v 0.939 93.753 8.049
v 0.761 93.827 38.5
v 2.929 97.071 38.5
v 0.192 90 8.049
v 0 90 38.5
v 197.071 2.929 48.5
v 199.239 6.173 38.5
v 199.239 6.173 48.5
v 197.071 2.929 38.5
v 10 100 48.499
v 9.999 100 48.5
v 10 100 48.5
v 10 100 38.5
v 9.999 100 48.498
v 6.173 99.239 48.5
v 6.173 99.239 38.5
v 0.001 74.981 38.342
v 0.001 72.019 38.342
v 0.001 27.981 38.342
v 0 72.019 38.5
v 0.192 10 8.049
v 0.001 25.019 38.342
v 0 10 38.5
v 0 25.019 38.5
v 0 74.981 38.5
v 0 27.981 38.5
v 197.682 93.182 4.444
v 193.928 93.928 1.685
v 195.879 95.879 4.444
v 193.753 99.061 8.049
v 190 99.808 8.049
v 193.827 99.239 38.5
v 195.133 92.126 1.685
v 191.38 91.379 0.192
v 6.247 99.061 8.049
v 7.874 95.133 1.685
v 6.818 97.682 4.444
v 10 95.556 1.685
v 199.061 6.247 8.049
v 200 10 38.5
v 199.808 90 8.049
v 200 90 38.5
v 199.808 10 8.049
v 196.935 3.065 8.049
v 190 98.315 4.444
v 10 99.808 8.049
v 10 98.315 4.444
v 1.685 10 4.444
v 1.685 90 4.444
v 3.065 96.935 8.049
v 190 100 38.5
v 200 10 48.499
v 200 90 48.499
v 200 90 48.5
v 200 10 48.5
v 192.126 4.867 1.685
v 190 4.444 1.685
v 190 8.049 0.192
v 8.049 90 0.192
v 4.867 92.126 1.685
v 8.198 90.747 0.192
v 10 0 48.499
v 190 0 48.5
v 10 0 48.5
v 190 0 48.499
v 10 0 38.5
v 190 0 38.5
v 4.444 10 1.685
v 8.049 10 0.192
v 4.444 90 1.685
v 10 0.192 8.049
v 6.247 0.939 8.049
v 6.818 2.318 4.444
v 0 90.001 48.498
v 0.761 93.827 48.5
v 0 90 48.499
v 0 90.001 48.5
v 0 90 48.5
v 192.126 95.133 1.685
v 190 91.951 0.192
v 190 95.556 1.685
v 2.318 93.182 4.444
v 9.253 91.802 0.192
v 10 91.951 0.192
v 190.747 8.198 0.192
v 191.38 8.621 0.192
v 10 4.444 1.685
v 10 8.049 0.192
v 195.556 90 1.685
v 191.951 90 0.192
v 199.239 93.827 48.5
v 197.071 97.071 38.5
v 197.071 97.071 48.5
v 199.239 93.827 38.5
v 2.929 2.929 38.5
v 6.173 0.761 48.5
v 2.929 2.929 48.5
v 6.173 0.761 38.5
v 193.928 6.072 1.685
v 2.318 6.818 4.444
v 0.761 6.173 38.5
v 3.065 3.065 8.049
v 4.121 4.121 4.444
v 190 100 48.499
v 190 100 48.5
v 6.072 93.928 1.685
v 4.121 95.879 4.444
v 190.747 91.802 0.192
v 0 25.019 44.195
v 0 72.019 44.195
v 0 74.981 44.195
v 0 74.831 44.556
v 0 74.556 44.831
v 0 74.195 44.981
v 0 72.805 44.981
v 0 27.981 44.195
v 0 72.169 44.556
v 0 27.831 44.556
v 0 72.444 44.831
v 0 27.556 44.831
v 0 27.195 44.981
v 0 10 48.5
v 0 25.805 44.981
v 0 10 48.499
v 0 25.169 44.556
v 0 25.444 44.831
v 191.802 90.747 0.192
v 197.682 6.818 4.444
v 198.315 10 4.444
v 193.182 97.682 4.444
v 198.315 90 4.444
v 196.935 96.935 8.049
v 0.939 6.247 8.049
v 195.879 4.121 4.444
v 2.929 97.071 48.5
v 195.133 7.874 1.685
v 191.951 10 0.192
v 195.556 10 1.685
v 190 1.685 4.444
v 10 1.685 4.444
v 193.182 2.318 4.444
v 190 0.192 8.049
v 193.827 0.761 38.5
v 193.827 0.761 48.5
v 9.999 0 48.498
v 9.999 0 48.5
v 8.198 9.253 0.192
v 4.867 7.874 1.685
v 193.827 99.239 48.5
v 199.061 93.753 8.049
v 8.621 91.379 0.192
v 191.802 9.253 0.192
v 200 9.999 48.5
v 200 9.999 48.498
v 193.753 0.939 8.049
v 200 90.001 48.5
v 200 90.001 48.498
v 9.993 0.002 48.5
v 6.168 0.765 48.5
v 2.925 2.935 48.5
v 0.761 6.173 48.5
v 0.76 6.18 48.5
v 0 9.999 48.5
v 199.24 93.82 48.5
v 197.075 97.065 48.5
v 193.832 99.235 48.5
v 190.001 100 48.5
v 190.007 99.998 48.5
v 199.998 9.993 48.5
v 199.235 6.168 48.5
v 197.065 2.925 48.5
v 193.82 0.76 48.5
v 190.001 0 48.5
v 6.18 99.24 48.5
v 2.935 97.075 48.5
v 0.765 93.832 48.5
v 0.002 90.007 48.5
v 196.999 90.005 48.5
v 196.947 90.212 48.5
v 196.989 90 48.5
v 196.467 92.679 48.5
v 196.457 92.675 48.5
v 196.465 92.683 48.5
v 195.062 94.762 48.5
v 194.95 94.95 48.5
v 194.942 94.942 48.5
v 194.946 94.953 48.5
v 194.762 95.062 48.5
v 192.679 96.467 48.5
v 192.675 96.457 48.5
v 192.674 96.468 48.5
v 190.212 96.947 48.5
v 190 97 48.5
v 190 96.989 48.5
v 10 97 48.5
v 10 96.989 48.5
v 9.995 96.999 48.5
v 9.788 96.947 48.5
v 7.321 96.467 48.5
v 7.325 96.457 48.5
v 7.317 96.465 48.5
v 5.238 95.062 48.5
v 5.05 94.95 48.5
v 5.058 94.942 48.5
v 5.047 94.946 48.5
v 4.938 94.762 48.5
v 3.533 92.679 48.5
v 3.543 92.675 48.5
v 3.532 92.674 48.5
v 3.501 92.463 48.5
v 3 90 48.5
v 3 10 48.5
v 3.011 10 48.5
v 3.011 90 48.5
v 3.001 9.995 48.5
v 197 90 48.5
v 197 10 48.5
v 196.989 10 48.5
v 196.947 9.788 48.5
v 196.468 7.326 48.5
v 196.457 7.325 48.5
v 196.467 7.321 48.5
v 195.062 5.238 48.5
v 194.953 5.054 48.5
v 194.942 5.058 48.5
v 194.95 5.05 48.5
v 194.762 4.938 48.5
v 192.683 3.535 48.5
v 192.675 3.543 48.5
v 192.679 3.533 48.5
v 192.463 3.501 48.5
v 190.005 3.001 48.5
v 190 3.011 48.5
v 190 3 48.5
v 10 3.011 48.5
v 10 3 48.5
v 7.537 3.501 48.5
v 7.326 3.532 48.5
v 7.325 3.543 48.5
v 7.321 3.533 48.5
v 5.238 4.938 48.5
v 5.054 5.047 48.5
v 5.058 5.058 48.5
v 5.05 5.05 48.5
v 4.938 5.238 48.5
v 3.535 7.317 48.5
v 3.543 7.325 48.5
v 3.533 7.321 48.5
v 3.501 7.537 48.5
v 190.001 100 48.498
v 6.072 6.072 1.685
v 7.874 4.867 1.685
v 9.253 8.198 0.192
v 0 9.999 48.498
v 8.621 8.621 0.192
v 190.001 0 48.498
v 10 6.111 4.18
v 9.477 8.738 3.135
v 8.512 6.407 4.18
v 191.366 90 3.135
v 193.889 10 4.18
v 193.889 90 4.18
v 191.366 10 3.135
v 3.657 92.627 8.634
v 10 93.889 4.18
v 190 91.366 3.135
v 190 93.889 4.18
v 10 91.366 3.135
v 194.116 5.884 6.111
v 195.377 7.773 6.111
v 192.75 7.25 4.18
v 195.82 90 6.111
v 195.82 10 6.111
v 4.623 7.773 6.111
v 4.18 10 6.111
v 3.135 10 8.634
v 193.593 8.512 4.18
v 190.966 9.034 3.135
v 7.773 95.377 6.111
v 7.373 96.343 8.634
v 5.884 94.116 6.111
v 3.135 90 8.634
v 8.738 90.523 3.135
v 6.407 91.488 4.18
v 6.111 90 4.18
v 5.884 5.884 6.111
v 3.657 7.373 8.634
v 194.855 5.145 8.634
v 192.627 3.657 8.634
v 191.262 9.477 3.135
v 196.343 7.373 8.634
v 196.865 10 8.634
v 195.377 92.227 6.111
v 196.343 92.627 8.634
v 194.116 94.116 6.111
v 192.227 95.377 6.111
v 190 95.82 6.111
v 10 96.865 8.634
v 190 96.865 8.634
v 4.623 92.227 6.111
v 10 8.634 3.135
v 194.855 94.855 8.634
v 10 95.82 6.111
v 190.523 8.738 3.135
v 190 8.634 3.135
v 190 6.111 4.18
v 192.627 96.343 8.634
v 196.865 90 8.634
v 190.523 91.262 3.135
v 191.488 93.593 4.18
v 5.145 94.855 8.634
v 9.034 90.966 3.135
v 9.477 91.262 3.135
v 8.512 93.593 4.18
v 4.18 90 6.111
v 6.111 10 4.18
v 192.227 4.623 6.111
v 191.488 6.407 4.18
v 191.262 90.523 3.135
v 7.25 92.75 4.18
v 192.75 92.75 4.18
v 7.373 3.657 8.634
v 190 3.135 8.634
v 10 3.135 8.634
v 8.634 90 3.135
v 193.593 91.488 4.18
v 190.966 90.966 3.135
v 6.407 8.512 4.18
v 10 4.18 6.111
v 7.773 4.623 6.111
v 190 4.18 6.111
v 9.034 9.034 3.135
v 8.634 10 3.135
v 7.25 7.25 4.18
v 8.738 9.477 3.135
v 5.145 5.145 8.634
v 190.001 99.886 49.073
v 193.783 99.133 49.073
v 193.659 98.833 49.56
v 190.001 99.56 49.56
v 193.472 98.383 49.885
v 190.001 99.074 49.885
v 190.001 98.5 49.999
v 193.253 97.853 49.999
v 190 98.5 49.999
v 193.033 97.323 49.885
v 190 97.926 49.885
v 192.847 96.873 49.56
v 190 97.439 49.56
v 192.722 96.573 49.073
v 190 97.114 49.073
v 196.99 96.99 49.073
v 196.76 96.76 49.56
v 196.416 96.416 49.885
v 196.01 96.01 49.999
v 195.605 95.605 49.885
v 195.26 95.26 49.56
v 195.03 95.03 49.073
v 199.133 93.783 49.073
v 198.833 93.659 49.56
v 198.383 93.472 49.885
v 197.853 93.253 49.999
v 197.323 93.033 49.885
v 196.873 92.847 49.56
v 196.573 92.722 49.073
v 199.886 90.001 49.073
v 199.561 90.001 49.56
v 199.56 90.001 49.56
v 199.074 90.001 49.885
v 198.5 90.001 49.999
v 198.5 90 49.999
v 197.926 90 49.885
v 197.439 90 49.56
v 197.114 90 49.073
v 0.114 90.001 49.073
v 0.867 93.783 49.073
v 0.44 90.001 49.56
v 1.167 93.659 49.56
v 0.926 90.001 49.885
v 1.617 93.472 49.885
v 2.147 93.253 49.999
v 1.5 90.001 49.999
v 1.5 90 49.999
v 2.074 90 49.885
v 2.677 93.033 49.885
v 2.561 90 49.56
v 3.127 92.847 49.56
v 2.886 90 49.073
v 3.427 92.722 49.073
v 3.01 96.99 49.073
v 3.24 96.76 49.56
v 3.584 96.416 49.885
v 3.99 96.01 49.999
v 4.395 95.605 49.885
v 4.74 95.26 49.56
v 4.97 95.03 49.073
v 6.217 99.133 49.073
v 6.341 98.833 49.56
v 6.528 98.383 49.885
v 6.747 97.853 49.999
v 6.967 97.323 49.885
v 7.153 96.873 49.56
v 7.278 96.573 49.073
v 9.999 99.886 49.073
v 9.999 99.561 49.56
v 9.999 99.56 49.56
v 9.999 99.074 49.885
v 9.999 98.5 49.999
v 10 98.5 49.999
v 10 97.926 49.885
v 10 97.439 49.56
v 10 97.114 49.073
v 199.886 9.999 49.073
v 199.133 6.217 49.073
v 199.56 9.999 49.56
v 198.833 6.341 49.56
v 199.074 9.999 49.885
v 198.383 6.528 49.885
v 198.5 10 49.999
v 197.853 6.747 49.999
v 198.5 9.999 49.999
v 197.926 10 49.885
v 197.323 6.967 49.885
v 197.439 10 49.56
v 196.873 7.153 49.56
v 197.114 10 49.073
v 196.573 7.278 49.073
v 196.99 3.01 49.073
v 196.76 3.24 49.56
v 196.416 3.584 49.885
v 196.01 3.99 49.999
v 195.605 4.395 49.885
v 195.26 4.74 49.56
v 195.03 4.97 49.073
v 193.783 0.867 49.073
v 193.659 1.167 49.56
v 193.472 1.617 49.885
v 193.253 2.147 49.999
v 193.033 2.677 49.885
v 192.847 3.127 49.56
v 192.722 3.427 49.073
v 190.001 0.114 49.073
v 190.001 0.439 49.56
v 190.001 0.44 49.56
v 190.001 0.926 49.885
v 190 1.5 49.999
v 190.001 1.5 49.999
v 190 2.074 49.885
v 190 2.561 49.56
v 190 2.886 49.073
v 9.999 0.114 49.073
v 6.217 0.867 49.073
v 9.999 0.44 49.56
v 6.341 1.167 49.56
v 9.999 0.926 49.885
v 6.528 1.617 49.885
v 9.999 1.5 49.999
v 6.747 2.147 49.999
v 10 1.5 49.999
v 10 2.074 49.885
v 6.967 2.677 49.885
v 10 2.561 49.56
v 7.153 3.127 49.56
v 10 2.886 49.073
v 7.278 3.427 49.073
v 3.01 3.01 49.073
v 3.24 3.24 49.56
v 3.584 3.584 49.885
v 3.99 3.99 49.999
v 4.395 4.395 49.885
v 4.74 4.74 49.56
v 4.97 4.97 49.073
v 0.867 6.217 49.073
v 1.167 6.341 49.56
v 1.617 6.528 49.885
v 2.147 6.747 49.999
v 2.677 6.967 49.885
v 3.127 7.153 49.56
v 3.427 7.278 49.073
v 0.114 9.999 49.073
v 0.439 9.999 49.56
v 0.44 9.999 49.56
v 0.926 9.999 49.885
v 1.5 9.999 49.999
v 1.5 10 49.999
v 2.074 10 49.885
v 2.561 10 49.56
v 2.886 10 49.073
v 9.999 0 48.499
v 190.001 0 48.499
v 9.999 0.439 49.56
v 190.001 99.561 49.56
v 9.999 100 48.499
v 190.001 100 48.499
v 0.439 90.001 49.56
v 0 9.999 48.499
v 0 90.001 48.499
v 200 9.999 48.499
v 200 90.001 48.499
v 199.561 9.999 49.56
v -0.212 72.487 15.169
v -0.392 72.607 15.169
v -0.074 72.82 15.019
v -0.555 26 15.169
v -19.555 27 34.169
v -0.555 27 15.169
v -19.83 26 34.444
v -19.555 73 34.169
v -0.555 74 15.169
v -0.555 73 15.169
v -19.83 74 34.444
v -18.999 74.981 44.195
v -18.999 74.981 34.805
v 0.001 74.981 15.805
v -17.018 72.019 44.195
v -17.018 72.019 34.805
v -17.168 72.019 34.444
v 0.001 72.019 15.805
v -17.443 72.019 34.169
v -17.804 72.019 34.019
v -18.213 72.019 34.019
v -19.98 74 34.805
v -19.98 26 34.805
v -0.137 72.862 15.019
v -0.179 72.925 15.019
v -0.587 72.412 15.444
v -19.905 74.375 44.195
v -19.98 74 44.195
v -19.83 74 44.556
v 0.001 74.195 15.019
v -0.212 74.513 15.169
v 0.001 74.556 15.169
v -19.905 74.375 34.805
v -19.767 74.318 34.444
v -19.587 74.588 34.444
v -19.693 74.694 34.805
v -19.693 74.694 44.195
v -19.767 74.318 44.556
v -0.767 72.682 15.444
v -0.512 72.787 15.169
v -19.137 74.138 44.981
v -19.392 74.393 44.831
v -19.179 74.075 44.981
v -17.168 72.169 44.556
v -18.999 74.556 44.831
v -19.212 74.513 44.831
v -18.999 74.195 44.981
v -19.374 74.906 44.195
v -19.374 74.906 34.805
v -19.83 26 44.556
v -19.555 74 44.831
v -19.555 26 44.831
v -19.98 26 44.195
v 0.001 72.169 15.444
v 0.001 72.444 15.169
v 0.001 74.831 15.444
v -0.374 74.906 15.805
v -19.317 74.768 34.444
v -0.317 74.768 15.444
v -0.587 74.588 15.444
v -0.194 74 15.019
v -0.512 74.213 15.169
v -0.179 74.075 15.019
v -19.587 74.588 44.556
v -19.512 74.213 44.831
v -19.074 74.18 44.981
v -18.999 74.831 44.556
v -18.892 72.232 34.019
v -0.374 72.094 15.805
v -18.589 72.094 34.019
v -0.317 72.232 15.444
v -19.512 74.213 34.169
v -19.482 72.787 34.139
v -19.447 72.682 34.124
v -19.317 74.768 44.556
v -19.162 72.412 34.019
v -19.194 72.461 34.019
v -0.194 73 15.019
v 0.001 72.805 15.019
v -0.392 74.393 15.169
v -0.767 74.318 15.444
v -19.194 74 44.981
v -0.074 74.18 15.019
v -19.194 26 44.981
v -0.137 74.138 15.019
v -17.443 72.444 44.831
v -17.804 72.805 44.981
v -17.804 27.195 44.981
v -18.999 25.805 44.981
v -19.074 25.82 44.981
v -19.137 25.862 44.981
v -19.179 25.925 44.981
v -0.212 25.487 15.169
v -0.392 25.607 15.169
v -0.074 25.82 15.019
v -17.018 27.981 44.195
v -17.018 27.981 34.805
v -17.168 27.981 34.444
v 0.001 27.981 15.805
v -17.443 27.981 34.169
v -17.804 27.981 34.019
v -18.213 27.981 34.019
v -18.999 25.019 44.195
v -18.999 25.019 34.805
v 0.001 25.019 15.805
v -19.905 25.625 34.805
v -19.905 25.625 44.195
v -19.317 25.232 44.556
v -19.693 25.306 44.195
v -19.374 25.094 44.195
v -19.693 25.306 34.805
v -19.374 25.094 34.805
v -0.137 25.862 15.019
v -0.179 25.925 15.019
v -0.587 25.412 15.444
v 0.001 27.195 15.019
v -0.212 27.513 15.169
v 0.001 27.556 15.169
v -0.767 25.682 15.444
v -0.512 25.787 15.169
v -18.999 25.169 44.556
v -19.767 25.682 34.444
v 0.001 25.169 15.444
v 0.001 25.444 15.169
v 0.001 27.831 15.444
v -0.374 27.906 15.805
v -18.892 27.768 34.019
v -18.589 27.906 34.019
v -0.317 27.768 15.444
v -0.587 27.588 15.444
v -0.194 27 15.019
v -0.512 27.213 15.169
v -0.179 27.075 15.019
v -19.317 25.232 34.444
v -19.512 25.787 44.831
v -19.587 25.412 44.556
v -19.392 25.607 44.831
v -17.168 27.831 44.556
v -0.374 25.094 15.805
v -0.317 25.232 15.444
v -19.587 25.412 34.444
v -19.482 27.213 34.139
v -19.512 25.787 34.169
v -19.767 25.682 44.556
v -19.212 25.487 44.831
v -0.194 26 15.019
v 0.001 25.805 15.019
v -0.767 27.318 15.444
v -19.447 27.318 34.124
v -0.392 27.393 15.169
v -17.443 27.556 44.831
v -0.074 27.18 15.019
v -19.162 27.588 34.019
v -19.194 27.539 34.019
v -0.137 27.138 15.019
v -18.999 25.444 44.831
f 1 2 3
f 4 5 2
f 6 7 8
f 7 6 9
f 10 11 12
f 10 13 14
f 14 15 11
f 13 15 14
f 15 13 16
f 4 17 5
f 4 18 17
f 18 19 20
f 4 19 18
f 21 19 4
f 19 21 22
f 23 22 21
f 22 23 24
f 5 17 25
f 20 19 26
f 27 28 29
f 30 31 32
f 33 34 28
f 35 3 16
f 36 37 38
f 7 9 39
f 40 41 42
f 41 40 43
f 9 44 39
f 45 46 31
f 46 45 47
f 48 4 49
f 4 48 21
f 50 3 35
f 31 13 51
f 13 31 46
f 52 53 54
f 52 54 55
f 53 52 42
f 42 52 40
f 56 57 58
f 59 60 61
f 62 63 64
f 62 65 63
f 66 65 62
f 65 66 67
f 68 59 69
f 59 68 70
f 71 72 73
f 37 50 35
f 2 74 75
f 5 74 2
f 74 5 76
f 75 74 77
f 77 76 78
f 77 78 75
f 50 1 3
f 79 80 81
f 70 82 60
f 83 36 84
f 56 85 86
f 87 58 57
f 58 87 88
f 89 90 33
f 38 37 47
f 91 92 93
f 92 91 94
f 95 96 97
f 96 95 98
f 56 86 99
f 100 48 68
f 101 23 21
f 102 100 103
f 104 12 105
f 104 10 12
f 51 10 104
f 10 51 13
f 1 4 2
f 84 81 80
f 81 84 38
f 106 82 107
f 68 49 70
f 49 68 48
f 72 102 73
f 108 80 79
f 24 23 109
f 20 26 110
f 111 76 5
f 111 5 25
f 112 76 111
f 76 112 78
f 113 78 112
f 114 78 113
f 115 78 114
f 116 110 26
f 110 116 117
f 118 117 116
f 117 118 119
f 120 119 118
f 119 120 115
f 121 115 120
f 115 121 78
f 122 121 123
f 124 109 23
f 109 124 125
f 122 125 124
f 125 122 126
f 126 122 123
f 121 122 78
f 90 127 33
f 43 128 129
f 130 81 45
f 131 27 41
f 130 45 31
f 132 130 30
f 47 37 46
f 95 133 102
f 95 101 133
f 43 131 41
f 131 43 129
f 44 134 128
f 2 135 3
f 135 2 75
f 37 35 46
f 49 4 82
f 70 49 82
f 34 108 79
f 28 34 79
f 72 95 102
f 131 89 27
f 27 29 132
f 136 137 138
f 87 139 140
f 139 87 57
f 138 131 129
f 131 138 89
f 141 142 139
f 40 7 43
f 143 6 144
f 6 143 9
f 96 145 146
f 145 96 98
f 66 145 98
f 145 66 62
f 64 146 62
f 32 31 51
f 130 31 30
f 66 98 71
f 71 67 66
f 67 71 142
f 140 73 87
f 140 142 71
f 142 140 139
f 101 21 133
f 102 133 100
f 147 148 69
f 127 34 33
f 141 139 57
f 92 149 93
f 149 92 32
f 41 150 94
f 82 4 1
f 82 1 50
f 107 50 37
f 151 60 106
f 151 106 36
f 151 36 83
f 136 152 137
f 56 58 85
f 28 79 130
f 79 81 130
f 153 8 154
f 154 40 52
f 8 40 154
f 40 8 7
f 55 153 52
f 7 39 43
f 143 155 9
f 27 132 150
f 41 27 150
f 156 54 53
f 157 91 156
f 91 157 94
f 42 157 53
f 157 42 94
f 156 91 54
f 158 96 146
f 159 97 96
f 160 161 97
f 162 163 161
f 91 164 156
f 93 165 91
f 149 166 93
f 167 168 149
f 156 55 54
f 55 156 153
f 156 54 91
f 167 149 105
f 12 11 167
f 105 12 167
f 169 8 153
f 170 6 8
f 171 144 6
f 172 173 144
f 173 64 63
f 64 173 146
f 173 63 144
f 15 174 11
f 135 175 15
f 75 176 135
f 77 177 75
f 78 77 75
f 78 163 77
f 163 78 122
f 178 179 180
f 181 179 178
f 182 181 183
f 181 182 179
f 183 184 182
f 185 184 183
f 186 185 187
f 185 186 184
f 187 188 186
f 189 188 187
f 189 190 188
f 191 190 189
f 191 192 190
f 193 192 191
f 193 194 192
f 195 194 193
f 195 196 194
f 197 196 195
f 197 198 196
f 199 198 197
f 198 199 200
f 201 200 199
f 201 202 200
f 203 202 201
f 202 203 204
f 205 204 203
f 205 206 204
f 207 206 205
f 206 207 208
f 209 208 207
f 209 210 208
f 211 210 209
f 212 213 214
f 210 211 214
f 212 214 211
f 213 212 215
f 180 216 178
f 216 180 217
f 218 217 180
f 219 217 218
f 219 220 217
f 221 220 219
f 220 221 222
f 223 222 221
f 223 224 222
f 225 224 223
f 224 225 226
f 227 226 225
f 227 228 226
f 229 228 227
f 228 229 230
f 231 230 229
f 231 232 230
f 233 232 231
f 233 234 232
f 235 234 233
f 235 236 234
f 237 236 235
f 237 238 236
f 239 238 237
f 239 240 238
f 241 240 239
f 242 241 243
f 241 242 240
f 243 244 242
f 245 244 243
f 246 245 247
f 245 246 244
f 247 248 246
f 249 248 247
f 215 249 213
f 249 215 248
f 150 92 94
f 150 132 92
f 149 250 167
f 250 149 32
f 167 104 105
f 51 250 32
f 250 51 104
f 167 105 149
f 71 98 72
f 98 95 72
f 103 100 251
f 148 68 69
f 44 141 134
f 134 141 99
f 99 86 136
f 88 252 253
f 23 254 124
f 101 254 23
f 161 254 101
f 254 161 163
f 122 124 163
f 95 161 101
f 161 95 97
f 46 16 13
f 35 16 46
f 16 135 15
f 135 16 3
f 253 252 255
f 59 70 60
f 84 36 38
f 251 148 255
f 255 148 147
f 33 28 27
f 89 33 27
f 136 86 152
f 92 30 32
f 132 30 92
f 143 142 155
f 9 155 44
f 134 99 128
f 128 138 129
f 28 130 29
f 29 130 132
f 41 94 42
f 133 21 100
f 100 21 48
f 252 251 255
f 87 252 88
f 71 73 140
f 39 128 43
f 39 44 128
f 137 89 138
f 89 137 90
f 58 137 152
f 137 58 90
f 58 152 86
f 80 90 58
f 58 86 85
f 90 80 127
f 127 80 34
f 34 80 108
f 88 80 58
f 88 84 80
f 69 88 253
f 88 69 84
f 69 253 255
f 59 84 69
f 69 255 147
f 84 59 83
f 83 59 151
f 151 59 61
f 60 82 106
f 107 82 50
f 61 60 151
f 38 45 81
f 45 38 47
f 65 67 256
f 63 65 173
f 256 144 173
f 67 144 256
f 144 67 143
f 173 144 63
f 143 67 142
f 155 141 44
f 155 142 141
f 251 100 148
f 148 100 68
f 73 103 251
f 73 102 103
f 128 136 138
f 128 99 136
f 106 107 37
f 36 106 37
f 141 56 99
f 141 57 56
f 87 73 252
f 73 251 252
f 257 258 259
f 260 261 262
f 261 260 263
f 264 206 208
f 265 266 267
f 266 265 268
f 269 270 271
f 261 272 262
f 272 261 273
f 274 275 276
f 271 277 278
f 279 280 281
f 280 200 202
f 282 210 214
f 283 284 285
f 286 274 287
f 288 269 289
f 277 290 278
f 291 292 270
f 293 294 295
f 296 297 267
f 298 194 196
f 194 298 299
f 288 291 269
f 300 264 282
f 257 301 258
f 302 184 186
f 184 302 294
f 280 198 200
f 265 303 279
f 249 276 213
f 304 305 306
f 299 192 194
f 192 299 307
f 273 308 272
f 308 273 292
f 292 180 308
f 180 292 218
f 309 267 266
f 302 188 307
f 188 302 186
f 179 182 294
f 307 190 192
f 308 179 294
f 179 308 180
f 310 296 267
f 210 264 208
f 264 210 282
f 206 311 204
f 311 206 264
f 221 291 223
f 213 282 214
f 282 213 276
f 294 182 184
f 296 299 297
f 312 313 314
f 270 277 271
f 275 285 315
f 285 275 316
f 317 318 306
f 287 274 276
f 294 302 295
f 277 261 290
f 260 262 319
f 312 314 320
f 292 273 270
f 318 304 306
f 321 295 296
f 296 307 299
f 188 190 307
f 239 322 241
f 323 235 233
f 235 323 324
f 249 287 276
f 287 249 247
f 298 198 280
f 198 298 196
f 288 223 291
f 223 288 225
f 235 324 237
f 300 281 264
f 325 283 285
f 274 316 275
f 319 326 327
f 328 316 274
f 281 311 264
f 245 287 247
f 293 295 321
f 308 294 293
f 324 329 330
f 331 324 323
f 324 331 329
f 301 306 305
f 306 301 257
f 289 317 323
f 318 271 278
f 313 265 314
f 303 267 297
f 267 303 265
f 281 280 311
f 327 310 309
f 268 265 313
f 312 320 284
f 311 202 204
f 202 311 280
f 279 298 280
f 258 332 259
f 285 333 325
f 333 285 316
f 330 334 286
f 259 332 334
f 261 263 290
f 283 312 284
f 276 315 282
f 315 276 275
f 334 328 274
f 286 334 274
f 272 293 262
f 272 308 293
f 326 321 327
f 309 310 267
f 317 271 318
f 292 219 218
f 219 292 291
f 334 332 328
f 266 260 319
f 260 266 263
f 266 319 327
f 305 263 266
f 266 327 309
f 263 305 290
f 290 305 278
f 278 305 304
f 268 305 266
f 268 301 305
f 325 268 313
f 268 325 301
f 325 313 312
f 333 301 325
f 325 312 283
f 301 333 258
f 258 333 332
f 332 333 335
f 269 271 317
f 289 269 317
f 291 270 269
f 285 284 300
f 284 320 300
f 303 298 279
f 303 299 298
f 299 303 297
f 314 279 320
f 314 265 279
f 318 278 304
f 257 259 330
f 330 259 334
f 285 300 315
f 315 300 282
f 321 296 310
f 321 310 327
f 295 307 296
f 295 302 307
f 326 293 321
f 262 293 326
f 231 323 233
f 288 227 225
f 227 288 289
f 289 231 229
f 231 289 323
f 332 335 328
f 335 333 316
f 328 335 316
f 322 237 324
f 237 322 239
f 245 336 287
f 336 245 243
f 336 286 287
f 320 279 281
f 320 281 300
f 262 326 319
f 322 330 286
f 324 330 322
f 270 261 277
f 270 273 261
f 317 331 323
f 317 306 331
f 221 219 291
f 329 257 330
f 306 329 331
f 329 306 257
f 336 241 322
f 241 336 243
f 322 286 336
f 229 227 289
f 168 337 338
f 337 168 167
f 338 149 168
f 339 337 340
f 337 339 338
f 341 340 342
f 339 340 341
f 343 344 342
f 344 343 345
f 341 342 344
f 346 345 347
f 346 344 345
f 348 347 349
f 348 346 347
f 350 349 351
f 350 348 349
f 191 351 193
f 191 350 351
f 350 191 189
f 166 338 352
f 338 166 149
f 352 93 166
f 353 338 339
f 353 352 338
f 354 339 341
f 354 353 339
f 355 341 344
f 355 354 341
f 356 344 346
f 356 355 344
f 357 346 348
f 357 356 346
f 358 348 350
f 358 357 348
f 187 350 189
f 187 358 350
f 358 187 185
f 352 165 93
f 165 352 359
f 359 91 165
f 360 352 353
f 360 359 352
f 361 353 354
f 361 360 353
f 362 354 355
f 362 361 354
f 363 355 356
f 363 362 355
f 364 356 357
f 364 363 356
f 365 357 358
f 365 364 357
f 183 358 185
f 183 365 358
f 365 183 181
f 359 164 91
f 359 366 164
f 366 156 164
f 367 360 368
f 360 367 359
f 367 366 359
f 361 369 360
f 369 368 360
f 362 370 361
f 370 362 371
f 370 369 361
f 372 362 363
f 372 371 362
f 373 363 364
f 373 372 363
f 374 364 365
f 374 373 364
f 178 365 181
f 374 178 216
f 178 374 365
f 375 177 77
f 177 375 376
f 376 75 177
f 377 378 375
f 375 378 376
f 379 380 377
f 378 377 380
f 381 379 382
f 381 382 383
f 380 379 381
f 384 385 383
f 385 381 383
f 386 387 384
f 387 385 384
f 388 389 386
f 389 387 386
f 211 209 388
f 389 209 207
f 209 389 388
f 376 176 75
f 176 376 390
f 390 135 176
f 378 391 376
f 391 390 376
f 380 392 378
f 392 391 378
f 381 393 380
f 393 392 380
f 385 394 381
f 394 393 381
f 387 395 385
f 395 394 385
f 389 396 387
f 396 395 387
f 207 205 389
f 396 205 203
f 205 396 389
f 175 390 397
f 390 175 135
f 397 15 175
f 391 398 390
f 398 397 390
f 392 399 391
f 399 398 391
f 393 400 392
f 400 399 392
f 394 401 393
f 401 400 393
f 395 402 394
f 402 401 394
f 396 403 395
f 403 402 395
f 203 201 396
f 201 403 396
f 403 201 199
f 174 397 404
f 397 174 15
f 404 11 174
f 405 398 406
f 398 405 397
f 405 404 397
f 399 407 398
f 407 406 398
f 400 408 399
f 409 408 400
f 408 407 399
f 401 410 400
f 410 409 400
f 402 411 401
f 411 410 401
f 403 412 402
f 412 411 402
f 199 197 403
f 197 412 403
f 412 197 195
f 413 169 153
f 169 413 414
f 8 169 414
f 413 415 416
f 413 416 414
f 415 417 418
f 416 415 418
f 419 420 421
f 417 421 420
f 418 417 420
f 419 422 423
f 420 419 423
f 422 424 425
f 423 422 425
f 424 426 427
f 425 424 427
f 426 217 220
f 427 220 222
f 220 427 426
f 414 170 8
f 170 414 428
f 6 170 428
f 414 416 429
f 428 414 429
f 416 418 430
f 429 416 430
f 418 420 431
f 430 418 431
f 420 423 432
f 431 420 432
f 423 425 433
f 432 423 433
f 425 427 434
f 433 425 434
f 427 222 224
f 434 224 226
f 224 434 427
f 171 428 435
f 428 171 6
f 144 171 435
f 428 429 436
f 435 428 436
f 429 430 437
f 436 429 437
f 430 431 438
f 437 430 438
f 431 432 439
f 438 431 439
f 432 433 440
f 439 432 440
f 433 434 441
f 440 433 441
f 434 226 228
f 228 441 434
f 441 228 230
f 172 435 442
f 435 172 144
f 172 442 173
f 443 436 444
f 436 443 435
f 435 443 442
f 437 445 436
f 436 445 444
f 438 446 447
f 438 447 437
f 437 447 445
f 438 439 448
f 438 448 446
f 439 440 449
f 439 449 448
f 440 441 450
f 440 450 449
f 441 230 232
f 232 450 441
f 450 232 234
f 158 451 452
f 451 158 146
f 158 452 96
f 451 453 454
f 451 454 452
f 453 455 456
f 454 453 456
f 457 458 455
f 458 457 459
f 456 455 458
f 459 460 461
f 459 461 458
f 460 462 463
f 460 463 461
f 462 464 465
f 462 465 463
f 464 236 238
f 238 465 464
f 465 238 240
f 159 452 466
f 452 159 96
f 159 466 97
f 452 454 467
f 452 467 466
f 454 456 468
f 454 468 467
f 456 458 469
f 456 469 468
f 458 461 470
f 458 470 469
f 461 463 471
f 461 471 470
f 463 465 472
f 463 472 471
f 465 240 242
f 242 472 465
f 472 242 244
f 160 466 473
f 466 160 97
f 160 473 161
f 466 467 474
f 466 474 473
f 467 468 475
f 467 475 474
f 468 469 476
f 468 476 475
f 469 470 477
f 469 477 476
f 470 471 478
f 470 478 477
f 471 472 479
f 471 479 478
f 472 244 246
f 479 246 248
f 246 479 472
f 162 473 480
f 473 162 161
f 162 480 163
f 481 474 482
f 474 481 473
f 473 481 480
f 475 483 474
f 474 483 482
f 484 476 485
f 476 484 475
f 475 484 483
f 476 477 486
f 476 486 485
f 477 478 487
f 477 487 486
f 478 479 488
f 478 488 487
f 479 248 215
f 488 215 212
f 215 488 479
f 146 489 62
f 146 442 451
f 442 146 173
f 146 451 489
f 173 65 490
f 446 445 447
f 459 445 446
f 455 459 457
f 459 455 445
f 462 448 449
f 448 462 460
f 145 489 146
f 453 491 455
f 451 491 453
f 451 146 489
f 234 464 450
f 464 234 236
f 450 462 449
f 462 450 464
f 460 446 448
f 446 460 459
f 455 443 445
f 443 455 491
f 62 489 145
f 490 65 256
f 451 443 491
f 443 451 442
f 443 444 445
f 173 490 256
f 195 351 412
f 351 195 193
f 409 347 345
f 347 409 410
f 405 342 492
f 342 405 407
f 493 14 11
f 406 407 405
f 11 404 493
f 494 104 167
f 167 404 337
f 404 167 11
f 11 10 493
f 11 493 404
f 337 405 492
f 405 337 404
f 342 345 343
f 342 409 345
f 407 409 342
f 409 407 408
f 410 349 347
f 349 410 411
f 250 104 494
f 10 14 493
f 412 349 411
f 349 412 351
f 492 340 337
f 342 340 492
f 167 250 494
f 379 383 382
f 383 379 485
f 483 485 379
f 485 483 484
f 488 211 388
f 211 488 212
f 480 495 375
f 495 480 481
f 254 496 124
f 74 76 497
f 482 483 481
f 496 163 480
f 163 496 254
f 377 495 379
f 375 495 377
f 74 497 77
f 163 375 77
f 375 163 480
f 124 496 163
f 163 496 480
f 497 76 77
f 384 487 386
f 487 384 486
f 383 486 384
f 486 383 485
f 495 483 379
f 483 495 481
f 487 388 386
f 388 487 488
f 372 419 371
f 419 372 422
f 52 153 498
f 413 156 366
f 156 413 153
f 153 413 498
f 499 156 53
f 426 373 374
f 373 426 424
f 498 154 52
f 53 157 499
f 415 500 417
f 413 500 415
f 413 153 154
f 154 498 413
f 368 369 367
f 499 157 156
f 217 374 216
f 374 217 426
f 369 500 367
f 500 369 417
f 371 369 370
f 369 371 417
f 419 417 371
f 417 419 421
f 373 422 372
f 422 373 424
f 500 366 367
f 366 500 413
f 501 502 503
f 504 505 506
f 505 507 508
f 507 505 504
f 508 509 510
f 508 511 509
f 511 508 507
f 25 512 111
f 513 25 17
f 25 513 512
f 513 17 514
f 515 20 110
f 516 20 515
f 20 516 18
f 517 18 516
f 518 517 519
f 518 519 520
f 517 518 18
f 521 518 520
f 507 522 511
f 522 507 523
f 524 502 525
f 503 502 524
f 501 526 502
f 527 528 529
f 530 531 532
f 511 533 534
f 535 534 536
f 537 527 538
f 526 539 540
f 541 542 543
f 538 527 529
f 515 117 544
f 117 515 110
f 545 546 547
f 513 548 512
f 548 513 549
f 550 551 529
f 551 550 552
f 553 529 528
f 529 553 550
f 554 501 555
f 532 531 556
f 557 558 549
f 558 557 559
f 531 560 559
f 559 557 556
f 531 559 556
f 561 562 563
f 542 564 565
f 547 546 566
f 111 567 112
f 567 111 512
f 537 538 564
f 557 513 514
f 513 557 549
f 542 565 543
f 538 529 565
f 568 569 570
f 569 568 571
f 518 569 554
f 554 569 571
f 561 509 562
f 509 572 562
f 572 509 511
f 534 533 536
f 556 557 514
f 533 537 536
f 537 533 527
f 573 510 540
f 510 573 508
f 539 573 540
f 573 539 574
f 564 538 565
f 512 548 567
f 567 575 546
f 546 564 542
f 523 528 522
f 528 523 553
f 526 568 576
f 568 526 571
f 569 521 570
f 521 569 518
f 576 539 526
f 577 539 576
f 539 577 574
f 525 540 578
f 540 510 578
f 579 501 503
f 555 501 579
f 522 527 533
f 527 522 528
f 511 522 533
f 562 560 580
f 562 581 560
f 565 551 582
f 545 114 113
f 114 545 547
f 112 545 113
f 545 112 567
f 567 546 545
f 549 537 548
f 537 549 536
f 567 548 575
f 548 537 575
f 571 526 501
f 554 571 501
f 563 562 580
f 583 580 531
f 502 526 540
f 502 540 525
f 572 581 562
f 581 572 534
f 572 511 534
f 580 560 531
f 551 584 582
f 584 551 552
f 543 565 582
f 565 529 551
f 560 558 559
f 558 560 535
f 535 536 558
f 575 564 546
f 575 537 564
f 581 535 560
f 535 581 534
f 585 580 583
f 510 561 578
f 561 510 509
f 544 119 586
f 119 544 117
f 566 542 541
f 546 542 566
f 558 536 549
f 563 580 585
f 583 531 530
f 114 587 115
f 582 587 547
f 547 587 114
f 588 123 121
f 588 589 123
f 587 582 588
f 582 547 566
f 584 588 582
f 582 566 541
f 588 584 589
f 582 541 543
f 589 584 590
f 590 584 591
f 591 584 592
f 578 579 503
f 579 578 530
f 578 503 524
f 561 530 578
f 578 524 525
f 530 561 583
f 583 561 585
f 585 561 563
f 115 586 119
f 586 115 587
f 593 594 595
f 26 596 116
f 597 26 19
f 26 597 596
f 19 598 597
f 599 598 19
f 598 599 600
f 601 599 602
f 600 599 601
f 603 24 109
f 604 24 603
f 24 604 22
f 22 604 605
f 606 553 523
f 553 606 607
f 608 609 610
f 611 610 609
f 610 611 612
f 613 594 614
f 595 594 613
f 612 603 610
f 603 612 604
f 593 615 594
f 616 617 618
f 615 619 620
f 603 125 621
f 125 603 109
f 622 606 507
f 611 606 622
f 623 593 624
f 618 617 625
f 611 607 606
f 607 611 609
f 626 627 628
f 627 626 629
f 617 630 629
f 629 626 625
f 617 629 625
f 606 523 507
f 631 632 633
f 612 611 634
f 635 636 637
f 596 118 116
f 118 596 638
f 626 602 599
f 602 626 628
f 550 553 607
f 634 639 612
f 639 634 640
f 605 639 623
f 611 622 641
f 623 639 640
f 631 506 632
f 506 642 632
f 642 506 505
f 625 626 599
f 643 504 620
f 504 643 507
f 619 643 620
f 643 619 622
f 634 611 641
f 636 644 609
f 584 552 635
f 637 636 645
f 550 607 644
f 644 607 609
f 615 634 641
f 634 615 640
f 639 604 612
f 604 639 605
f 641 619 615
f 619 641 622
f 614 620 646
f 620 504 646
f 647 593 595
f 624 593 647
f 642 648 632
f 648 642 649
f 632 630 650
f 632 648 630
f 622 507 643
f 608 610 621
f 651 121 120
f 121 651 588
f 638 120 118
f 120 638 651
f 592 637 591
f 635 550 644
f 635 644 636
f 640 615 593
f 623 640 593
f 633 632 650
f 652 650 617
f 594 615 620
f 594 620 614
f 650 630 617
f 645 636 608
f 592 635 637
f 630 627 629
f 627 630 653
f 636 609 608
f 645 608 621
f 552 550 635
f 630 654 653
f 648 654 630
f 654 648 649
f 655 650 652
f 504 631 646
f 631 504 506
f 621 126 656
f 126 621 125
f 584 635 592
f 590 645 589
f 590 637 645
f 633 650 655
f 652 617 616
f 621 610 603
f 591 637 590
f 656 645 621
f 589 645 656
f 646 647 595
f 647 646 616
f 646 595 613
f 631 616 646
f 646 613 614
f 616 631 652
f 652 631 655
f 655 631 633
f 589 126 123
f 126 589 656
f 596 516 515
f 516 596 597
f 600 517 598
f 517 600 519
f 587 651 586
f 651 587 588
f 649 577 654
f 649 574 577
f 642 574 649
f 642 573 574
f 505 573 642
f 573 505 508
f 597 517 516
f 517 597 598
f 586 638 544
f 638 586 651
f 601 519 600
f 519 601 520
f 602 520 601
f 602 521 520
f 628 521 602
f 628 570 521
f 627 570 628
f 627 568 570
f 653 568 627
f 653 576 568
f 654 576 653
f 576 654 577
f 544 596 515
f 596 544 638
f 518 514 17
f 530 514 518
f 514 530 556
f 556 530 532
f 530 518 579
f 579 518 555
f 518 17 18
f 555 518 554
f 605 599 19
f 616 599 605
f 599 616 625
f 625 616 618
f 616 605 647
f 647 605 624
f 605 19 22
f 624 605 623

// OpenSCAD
$fn=16;
wall = 3;
cube=[200,100,50];
handle=[20,50,30];
handleH=15;
r=10;
f=1;

not=0.001;
////////////////////////////////////////////////////////
box(cube,wall,r);
tr([not,cube.y/2,handleH],180) handle(handle,wall,f);

////////////////////////////////////////////////////////
module handle(size=[7,20,10],wall=2,f=1){
	t([0,-size.y/2,0]) intersection(){
		cube(size);
		
		u(){
			for(y=[0,size.y-wall]){
				t([0,y,0]) hull(){
					for(w=[f,wall-f]){
						t([0,w,f]) sphere(r=f);
						t([size.x-f,w,size.x]) sphere(r=f);
						t([size.x-f,w,size.z-f]) sphere(r=f);
						t([0,w,size.z-f]) sphere(r=f);
					}
				}
			}

			hull(){
				for(w=[f,size.y-f]){
					t([size.x-f,w,size.x]) sphere(r=f);
					t([size.x-wall+f,w,size.x]) sphere(r=f);
					
					t([size.x-f,w,size.z-f]) sphere(r=f);
					t([size.x-wall+f,w,size.z-f]) sphere(r=f);
				}
			}
		}
	}
}

module box(size=[50,30,20],wall=2,r=10){
	module top(size=[9,9,1],r=1){
		r1=size[2]/2;
		r2=r;
		
		t([size[0]-r2,size[1]-r2,0]) quartTorus(r1,r2-r1);
		tr([r2,size[1]-r2,0],[0,0,90]) quartTorus(r1,r2-r1);
		tr([size[0]-r2,r2,0],[0,0,-90]) quartTorus(r1,r2-r1);
		tr([r2,r2,0],[0,0,180]) quartTorus(r1,r2-r1);
		
		tr([r2-not,r1,0],[0,90,0]) cylinder(h=size[0]-2*r2+2*not,r=r1);
		tr([r2-not,size[1]-r1,0],[0,90,0]) cylinder(h=size[0]-2*r2+2*not,r=r1);
		tr([r1,r2-not,0],[-90,90,0]) cylinder(h=size[1]-2*r2+2*not,r=r1);
		tr([size[0]-r1,r2-not,0],[-90,90,0]) cylinder(h=size[1]-2*r2+2*not,r=r1);
	}

	module quartTorus(r1=3, r2=5){
		intersection(){
			rotate_extrude(convexity = 10) t([r2, 0, 0]) circle(r=r1);
			t([0,0,-2*r1]) cube([r1+r2,r1+r2,4*r1]);
		}
	}

	module roundedCube(size = [9,9,9], r = 3){
		if(r<=0)
			cube(size);
		else {
			hull(){
				t([r,r,r]) sphere(r=r);
				t([size[0]-r,r,r]) sphere(r=r);
				t([r,size[1]-r,r]) sphere(r=r);
				t([size[0]-r,size[1]-r,r]) sphere(r=r);

				t([r,r,size[2]-r]) cylinder(h=r,r=r);
				t([size[0]-r,r,size[2]-r]) cylinder(h=r,r=r);
				t([r,size[1]-r,size[2]-r]) cylinder(h=r,r=r);
				t([size[0]-r,size[1]-r,size[2]-r]) cylinder(h=r,r=r);
			}
		}
	}

	rInner = r-wall;
	difference(){
		roundedCube([size.x,size.y,size.z-wall/2],r);
		t([wall,wall,wall]) roundedCube([size.x-2*wall,size.y-2*wall,size.z+2*wall], rInner);
	}
	t([0,0,size.z-wall/2-not]) top([size.x,size.y,wall],r);
}


////////////////////////////////////////////////////////


module t(v=[0,0,0]){translate(v) children();}
module r(a=[0,0,0],rp=[0,0,0]){translate(rp) rotate(a) translate(-rp) children();}
module tr(v=[0,0,0],a=[0,0,0],rp=[0,0,0]){t(v) r(a,rp) children();}
module rt(a=[0,0,0],rp=[0,0,0],v=[0,0,0]){r(a,rp) t(v) children();}
module u(){union() children();}
